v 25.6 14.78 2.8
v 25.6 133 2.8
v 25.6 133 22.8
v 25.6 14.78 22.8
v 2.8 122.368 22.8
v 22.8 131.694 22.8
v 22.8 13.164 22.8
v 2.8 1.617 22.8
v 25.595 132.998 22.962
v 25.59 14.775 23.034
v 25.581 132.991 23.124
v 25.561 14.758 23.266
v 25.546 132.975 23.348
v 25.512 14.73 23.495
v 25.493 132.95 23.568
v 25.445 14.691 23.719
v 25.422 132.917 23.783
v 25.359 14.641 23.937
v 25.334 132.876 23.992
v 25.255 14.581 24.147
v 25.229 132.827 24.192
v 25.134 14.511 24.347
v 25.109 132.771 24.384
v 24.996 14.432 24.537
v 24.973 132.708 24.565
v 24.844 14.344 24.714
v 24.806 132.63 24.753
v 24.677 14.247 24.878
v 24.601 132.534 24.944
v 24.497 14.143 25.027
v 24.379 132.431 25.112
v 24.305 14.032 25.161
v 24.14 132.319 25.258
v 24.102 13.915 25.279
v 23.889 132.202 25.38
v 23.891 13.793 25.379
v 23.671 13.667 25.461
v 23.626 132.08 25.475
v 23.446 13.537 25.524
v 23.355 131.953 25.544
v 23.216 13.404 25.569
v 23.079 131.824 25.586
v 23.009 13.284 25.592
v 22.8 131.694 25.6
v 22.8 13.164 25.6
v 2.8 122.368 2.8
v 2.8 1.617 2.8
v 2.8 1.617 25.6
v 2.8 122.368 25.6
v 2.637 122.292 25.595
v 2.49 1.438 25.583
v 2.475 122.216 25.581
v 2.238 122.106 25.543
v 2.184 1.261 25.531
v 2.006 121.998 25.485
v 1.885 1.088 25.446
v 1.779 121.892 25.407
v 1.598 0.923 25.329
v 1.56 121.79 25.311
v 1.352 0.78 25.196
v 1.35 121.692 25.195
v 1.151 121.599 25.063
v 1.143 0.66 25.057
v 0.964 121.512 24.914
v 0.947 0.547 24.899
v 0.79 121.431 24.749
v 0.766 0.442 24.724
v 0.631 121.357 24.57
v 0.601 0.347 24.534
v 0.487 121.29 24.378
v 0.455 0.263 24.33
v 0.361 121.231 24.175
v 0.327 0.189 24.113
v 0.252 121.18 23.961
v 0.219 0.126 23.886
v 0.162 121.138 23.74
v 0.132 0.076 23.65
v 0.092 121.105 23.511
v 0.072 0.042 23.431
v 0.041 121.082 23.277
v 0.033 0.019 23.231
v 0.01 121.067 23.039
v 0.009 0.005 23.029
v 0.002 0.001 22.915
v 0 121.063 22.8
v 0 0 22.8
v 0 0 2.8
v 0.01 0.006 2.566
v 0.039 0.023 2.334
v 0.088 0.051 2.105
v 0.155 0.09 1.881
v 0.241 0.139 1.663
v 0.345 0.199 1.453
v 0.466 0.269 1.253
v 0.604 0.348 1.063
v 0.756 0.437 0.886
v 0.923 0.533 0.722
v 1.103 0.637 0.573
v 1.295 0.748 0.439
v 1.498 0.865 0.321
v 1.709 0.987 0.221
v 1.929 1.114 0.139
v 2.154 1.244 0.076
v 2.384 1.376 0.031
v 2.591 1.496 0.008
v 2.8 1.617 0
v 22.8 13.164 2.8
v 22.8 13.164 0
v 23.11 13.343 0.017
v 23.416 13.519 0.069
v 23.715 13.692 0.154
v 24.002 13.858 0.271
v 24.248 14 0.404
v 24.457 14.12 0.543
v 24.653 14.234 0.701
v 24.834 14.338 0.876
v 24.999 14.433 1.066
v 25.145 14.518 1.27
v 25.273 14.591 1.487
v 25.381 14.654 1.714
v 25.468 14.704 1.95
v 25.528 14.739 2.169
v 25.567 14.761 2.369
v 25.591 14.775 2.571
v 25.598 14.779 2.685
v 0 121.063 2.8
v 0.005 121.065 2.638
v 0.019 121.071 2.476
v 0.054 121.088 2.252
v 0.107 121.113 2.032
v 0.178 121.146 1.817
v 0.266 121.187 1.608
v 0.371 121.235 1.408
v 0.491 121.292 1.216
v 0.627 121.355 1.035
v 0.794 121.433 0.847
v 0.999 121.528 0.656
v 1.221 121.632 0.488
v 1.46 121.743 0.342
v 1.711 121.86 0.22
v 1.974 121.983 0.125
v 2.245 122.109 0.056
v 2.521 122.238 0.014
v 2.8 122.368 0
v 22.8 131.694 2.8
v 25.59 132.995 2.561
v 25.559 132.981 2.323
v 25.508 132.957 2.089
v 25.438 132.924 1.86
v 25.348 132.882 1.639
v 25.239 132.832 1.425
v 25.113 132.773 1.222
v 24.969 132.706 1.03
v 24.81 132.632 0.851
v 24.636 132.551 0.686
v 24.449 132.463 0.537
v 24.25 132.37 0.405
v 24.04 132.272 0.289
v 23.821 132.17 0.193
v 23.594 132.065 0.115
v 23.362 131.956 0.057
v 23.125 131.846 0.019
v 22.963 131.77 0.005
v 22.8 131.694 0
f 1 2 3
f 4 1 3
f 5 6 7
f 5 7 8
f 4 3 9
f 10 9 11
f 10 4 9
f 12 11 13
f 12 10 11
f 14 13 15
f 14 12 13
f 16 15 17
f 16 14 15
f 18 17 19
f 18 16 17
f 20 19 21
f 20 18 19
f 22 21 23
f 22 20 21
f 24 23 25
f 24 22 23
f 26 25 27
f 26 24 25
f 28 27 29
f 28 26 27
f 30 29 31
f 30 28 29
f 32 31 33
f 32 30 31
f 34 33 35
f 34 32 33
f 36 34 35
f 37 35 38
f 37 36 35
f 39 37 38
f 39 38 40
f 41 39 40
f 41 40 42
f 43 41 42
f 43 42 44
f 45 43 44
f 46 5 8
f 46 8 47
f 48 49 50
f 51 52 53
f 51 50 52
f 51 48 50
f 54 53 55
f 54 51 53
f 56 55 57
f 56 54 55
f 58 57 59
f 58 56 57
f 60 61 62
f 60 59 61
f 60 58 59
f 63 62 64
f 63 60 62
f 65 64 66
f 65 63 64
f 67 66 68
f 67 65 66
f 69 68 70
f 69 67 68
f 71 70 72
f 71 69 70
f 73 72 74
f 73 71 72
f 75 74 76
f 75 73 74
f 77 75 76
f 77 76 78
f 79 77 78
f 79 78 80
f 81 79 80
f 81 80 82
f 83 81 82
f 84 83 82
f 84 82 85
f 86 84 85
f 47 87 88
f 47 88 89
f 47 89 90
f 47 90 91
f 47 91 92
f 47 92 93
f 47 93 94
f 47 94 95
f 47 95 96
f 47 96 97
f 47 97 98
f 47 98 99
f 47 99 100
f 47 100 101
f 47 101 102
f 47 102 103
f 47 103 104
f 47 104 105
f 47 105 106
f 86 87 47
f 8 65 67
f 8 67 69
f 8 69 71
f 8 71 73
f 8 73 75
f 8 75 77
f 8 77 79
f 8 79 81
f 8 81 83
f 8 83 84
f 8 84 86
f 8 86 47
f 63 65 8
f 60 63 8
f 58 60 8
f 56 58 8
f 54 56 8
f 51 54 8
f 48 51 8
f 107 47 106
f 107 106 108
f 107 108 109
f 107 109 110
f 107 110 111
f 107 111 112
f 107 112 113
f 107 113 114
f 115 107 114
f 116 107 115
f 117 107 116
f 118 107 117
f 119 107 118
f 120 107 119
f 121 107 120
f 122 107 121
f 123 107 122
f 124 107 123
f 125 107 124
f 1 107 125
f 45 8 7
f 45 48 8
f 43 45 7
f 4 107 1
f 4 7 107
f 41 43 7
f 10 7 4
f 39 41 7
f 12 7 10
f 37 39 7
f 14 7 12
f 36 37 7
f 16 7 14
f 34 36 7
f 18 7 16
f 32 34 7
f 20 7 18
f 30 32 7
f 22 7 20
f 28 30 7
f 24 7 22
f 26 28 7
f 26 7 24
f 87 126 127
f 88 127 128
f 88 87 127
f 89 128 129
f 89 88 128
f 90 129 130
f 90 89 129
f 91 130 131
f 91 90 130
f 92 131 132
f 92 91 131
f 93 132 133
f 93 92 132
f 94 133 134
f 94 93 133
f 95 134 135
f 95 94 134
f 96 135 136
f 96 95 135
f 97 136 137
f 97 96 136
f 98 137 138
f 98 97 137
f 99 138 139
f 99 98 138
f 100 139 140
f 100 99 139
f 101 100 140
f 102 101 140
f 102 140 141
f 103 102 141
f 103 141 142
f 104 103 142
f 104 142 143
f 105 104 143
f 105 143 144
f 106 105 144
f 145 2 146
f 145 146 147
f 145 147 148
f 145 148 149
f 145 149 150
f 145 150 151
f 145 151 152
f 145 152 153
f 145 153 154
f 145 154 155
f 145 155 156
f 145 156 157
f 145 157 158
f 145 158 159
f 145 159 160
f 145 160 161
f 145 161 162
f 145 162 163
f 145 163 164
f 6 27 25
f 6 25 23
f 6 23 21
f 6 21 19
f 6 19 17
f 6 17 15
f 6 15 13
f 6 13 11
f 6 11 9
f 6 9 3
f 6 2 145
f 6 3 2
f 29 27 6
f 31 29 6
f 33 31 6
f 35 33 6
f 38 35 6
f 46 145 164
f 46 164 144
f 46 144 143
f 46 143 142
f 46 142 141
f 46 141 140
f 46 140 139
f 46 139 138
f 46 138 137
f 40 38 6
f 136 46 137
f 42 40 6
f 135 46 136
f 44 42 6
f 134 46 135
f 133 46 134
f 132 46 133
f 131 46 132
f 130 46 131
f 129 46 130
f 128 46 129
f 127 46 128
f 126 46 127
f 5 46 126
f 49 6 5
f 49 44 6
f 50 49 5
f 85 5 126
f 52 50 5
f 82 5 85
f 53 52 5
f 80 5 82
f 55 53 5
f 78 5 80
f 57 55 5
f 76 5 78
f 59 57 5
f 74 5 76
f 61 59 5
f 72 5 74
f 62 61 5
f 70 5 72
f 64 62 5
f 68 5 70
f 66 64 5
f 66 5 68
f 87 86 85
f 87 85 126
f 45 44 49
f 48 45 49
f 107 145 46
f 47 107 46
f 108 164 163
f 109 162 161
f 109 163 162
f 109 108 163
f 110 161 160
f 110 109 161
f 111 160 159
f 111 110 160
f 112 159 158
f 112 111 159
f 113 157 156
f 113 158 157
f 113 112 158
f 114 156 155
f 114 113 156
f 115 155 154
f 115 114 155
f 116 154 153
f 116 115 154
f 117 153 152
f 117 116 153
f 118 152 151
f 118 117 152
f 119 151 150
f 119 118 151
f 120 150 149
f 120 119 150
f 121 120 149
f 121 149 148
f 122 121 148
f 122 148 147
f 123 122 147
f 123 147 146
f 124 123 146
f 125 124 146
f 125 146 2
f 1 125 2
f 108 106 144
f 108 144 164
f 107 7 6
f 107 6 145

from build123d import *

# Parameters (mm, degrees)
BOSS_EXTRUDE1_DEPTH     = 133
SKETCH3_W               = 20
SKETCH3_H               = 20
CUT_EXTRUDE1_DEPTH      = 1040.5
CUT_EXTRUDE2_DEPTH      = 138.347005792
CUT_EXTRUDE2_DEPTH_BACK = 138.347005792
CUT_EXTRUDE3_DEPTH      = 138.347005792
CUT_EXTRUDE3_DEPTH_BACK = 138.347005792


with BuildPart() as part:
    # Sketch1 → Boss-Extrude1 (new body)
    with BuildSketch(Plane(origin=(0, 0, 0), x_dir=(1, 0, 0), z_dir=(0, 1, 0))):
        with BuildLine():
            Line((2.8, 0), (22.8, 0))
            ThreePointArc((22.8, 0), (24.779898987, -0.820101013), (25.6, -2.8))
            Line((25.6, -2.8), (25.6, -22.8))
            ThreePointArc((25.6, -22.8), (24.779898987, -24.779898987), (22.8, -25.6))
            Line((22.8, -25.6), (2.8, -25.6))
            ThreePointArc((2.8, -25.6), (0.820101013, -24.779898987), (0, -22.8))
            Line((0, -22.8), (0, -2.8))
            ThreePointArc((0, -2.8), (0.820101013, -0.820101013), (2.8, 0))
        make_face()
    extrude(amount=BOSS_EXTRUDE1_DEPTH)

    # Sketch3 → Cut-Extrude1 (cut)
    with BuildSketch(Plane(origin=(0, 0, 0), x_dir=(-1, 0, 0), z_dir=(0, -1, 0))):
        with Locations((-12.8, -12.8)):
            Rectangle(SKETCH3_W, SKETCH3_H)
    extrude(amount=-CUT_EXTRUDE1_DEPTH, mode=Mode.SUBTRACT)

    # Sketch4 → Cut-Extrude2 (cut, two sides: drawn at the far end of the back side and taken through both)
    with BuildSketch(Plane(origin=(0, 0, 22.8), x_dir=(-1, 0, 0), z_dir=(0, 0, -1)).offset(-CUT_EXTRUDE2_DEPTH_BACK)):
        Polygon((-280.166183006, 251.706160643), (-25.6, 133), (0, 121.062523951), (254.566183006, 2.356363308), (491.978504292, 511.48872932), (-42.75386172, 760.838526655), align=None)
    extrude(amount=CUT_EXTRUDE2_DEPTH + CUT_EXTRUDE2_DEPTH_BACK, mode=Mode.SUBTRACT)

    # Sketch5 → Cut-Extrude3 (cut, two sides: drawn at the far end of the back side and taken through both)
    with BuildSketch(Plane(origin=(0, 0, 22.8), x_dir=(-1, 0, 0), z_dir=(0, 0, -1)).offset(-CUT_EXTRUDE3_DEPTH_BACK)):
        Polygon((243.251558225, -140.441352622), (0, 0), (-25.6, 14.780166891), (-268.851558225, 155.221519513), (-549.734263468, -331.281596936), (-37.631147019, -626.944469071), align=None)
    extrude(amount=CUT_EXTRUDE3_DEPTH + CUT_EXTRUDE3_DEPTH_BACK, mode=Mode.SUBTRACT)


solid = part.part
